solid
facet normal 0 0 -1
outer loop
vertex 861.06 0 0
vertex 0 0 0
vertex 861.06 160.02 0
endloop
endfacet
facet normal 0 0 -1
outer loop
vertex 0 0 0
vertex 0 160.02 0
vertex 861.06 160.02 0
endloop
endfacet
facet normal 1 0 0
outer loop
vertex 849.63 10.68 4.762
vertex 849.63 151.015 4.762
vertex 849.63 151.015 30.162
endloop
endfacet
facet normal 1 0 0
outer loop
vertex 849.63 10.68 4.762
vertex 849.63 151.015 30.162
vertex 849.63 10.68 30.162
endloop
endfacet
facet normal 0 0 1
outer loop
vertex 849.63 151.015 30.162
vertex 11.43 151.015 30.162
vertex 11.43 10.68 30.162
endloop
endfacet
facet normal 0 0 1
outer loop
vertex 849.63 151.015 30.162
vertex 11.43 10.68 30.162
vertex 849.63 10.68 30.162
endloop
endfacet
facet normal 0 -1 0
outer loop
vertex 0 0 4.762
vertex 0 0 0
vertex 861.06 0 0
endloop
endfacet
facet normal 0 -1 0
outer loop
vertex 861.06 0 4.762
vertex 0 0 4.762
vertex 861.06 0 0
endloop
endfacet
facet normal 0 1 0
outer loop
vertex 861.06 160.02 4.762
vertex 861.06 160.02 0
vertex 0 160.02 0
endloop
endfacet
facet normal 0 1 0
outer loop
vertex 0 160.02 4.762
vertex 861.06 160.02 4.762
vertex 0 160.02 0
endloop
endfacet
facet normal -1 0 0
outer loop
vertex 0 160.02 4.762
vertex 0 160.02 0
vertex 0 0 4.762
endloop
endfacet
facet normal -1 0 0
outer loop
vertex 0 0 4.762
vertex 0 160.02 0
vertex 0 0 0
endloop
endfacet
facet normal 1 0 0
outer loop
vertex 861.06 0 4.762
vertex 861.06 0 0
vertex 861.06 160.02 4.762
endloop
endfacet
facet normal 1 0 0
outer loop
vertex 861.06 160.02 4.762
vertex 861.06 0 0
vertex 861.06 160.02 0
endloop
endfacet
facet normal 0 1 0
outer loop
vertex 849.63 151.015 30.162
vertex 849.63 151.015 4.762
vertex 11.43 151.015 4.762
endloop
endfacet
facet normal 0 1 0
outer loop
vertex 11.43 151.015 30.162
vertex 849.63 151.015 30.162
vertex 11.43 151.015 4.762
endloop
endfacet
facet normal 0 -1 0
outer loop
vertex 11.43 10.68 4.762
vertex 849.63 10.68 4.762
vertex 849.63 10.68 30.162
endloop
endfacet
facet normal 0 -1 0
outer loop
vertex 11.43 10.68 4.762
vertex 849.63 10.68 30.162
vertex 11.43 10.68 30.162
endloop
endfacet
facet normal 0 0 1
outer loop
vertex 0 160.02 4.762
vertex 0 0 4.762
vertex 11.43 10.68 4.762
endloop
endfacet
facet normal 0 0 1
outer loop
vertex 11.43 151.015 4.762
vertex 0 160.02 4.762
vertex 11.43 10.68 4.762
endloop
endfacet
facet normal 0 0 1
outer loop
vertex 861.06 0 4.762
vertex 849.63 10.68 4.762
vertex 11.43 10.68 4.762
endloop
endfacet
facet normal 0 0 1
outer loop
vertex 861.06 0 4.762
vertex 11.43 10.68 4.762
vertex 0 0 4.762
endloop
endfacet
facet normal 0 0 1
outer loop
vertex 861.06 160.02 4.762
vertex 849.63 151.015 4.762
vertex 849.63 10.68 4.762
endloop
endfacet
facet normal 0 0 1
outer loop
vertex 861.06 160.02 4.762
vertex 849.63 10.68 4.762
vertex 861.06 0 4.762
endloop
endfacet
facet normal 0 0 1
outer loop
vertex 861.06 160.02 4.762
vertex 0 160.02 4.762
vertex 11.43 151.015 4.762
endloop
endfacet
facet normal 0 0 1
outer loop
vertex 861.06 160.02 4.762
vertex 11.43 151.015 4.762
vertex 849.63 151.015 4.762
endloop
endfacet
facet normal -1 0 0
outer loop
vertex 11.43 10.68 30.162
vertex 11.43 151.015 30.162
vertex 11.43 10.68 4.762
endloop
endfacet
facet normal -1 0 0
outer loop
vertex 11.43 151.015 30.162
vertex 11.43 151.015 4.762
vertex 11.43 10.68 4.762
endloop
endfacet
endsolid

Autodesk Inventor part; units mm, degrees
ref_plane "YZ Plane" through (0, 0, 0) normal (1, 0, 0) x (0, 1, 0)
ref_plane "XZ Plane" through (0, 0, 0) normal (0, 1, 0) x (-1, 0, 0)
ref_plane "XY Plane" through (0, 0, 0) normal (0, 0, 1) x (1, 0, 0)
sketch "Sketch1" plane through (0, 0, 0) normal (0, 0, 1) x (1, 0, 0)
  line L0 (0, 0) -> (861.06, 0)
  line L1 (861.06, 0) -> (861.06, 160.02)
  line L2 (861.06, 160.02) -> (0, 160.02)
  line L3 (0, 160.02) -> (0, 0)
  dimension "d2" = 861.06
  dimension "d3" = 160.02
extrude "Extrusion1" add sketch "Sketch1" along normal blind 4.7625
sketch "Sketch2" plane through (0, 0, 4.7625) normal (0, 0, 1) x (1, 0, 0)
  line L0 (849.63, 151.0147) -> (11.43, 151.0147) projected
  line L1 (887.73, 10.6797) -> (-26.67, 10.6797) projected
  line L2 (849.63, 848.8797) -> (849.63, 10.6797) projected
  line L3 (11.43, 848.8797) -> (11.43, 10.6797) projected
  line L4 (849.63, 10.6797) -> (11.43, 10.6797)
  line L5 (11.43, 10.6797) -> (11.43, 151.0147)
  line L6 (11.43, 151.0147) -> (849.63, 151.0147)
  line L7 (849.63, 151.0147) -> (849.63, 10.6797)
  point P0 (0, 0)
extrude "Extrusion2" add sketch "Sketch2" along normal blind 25.4
properties part number "gatorboard_01875in_front_door"
